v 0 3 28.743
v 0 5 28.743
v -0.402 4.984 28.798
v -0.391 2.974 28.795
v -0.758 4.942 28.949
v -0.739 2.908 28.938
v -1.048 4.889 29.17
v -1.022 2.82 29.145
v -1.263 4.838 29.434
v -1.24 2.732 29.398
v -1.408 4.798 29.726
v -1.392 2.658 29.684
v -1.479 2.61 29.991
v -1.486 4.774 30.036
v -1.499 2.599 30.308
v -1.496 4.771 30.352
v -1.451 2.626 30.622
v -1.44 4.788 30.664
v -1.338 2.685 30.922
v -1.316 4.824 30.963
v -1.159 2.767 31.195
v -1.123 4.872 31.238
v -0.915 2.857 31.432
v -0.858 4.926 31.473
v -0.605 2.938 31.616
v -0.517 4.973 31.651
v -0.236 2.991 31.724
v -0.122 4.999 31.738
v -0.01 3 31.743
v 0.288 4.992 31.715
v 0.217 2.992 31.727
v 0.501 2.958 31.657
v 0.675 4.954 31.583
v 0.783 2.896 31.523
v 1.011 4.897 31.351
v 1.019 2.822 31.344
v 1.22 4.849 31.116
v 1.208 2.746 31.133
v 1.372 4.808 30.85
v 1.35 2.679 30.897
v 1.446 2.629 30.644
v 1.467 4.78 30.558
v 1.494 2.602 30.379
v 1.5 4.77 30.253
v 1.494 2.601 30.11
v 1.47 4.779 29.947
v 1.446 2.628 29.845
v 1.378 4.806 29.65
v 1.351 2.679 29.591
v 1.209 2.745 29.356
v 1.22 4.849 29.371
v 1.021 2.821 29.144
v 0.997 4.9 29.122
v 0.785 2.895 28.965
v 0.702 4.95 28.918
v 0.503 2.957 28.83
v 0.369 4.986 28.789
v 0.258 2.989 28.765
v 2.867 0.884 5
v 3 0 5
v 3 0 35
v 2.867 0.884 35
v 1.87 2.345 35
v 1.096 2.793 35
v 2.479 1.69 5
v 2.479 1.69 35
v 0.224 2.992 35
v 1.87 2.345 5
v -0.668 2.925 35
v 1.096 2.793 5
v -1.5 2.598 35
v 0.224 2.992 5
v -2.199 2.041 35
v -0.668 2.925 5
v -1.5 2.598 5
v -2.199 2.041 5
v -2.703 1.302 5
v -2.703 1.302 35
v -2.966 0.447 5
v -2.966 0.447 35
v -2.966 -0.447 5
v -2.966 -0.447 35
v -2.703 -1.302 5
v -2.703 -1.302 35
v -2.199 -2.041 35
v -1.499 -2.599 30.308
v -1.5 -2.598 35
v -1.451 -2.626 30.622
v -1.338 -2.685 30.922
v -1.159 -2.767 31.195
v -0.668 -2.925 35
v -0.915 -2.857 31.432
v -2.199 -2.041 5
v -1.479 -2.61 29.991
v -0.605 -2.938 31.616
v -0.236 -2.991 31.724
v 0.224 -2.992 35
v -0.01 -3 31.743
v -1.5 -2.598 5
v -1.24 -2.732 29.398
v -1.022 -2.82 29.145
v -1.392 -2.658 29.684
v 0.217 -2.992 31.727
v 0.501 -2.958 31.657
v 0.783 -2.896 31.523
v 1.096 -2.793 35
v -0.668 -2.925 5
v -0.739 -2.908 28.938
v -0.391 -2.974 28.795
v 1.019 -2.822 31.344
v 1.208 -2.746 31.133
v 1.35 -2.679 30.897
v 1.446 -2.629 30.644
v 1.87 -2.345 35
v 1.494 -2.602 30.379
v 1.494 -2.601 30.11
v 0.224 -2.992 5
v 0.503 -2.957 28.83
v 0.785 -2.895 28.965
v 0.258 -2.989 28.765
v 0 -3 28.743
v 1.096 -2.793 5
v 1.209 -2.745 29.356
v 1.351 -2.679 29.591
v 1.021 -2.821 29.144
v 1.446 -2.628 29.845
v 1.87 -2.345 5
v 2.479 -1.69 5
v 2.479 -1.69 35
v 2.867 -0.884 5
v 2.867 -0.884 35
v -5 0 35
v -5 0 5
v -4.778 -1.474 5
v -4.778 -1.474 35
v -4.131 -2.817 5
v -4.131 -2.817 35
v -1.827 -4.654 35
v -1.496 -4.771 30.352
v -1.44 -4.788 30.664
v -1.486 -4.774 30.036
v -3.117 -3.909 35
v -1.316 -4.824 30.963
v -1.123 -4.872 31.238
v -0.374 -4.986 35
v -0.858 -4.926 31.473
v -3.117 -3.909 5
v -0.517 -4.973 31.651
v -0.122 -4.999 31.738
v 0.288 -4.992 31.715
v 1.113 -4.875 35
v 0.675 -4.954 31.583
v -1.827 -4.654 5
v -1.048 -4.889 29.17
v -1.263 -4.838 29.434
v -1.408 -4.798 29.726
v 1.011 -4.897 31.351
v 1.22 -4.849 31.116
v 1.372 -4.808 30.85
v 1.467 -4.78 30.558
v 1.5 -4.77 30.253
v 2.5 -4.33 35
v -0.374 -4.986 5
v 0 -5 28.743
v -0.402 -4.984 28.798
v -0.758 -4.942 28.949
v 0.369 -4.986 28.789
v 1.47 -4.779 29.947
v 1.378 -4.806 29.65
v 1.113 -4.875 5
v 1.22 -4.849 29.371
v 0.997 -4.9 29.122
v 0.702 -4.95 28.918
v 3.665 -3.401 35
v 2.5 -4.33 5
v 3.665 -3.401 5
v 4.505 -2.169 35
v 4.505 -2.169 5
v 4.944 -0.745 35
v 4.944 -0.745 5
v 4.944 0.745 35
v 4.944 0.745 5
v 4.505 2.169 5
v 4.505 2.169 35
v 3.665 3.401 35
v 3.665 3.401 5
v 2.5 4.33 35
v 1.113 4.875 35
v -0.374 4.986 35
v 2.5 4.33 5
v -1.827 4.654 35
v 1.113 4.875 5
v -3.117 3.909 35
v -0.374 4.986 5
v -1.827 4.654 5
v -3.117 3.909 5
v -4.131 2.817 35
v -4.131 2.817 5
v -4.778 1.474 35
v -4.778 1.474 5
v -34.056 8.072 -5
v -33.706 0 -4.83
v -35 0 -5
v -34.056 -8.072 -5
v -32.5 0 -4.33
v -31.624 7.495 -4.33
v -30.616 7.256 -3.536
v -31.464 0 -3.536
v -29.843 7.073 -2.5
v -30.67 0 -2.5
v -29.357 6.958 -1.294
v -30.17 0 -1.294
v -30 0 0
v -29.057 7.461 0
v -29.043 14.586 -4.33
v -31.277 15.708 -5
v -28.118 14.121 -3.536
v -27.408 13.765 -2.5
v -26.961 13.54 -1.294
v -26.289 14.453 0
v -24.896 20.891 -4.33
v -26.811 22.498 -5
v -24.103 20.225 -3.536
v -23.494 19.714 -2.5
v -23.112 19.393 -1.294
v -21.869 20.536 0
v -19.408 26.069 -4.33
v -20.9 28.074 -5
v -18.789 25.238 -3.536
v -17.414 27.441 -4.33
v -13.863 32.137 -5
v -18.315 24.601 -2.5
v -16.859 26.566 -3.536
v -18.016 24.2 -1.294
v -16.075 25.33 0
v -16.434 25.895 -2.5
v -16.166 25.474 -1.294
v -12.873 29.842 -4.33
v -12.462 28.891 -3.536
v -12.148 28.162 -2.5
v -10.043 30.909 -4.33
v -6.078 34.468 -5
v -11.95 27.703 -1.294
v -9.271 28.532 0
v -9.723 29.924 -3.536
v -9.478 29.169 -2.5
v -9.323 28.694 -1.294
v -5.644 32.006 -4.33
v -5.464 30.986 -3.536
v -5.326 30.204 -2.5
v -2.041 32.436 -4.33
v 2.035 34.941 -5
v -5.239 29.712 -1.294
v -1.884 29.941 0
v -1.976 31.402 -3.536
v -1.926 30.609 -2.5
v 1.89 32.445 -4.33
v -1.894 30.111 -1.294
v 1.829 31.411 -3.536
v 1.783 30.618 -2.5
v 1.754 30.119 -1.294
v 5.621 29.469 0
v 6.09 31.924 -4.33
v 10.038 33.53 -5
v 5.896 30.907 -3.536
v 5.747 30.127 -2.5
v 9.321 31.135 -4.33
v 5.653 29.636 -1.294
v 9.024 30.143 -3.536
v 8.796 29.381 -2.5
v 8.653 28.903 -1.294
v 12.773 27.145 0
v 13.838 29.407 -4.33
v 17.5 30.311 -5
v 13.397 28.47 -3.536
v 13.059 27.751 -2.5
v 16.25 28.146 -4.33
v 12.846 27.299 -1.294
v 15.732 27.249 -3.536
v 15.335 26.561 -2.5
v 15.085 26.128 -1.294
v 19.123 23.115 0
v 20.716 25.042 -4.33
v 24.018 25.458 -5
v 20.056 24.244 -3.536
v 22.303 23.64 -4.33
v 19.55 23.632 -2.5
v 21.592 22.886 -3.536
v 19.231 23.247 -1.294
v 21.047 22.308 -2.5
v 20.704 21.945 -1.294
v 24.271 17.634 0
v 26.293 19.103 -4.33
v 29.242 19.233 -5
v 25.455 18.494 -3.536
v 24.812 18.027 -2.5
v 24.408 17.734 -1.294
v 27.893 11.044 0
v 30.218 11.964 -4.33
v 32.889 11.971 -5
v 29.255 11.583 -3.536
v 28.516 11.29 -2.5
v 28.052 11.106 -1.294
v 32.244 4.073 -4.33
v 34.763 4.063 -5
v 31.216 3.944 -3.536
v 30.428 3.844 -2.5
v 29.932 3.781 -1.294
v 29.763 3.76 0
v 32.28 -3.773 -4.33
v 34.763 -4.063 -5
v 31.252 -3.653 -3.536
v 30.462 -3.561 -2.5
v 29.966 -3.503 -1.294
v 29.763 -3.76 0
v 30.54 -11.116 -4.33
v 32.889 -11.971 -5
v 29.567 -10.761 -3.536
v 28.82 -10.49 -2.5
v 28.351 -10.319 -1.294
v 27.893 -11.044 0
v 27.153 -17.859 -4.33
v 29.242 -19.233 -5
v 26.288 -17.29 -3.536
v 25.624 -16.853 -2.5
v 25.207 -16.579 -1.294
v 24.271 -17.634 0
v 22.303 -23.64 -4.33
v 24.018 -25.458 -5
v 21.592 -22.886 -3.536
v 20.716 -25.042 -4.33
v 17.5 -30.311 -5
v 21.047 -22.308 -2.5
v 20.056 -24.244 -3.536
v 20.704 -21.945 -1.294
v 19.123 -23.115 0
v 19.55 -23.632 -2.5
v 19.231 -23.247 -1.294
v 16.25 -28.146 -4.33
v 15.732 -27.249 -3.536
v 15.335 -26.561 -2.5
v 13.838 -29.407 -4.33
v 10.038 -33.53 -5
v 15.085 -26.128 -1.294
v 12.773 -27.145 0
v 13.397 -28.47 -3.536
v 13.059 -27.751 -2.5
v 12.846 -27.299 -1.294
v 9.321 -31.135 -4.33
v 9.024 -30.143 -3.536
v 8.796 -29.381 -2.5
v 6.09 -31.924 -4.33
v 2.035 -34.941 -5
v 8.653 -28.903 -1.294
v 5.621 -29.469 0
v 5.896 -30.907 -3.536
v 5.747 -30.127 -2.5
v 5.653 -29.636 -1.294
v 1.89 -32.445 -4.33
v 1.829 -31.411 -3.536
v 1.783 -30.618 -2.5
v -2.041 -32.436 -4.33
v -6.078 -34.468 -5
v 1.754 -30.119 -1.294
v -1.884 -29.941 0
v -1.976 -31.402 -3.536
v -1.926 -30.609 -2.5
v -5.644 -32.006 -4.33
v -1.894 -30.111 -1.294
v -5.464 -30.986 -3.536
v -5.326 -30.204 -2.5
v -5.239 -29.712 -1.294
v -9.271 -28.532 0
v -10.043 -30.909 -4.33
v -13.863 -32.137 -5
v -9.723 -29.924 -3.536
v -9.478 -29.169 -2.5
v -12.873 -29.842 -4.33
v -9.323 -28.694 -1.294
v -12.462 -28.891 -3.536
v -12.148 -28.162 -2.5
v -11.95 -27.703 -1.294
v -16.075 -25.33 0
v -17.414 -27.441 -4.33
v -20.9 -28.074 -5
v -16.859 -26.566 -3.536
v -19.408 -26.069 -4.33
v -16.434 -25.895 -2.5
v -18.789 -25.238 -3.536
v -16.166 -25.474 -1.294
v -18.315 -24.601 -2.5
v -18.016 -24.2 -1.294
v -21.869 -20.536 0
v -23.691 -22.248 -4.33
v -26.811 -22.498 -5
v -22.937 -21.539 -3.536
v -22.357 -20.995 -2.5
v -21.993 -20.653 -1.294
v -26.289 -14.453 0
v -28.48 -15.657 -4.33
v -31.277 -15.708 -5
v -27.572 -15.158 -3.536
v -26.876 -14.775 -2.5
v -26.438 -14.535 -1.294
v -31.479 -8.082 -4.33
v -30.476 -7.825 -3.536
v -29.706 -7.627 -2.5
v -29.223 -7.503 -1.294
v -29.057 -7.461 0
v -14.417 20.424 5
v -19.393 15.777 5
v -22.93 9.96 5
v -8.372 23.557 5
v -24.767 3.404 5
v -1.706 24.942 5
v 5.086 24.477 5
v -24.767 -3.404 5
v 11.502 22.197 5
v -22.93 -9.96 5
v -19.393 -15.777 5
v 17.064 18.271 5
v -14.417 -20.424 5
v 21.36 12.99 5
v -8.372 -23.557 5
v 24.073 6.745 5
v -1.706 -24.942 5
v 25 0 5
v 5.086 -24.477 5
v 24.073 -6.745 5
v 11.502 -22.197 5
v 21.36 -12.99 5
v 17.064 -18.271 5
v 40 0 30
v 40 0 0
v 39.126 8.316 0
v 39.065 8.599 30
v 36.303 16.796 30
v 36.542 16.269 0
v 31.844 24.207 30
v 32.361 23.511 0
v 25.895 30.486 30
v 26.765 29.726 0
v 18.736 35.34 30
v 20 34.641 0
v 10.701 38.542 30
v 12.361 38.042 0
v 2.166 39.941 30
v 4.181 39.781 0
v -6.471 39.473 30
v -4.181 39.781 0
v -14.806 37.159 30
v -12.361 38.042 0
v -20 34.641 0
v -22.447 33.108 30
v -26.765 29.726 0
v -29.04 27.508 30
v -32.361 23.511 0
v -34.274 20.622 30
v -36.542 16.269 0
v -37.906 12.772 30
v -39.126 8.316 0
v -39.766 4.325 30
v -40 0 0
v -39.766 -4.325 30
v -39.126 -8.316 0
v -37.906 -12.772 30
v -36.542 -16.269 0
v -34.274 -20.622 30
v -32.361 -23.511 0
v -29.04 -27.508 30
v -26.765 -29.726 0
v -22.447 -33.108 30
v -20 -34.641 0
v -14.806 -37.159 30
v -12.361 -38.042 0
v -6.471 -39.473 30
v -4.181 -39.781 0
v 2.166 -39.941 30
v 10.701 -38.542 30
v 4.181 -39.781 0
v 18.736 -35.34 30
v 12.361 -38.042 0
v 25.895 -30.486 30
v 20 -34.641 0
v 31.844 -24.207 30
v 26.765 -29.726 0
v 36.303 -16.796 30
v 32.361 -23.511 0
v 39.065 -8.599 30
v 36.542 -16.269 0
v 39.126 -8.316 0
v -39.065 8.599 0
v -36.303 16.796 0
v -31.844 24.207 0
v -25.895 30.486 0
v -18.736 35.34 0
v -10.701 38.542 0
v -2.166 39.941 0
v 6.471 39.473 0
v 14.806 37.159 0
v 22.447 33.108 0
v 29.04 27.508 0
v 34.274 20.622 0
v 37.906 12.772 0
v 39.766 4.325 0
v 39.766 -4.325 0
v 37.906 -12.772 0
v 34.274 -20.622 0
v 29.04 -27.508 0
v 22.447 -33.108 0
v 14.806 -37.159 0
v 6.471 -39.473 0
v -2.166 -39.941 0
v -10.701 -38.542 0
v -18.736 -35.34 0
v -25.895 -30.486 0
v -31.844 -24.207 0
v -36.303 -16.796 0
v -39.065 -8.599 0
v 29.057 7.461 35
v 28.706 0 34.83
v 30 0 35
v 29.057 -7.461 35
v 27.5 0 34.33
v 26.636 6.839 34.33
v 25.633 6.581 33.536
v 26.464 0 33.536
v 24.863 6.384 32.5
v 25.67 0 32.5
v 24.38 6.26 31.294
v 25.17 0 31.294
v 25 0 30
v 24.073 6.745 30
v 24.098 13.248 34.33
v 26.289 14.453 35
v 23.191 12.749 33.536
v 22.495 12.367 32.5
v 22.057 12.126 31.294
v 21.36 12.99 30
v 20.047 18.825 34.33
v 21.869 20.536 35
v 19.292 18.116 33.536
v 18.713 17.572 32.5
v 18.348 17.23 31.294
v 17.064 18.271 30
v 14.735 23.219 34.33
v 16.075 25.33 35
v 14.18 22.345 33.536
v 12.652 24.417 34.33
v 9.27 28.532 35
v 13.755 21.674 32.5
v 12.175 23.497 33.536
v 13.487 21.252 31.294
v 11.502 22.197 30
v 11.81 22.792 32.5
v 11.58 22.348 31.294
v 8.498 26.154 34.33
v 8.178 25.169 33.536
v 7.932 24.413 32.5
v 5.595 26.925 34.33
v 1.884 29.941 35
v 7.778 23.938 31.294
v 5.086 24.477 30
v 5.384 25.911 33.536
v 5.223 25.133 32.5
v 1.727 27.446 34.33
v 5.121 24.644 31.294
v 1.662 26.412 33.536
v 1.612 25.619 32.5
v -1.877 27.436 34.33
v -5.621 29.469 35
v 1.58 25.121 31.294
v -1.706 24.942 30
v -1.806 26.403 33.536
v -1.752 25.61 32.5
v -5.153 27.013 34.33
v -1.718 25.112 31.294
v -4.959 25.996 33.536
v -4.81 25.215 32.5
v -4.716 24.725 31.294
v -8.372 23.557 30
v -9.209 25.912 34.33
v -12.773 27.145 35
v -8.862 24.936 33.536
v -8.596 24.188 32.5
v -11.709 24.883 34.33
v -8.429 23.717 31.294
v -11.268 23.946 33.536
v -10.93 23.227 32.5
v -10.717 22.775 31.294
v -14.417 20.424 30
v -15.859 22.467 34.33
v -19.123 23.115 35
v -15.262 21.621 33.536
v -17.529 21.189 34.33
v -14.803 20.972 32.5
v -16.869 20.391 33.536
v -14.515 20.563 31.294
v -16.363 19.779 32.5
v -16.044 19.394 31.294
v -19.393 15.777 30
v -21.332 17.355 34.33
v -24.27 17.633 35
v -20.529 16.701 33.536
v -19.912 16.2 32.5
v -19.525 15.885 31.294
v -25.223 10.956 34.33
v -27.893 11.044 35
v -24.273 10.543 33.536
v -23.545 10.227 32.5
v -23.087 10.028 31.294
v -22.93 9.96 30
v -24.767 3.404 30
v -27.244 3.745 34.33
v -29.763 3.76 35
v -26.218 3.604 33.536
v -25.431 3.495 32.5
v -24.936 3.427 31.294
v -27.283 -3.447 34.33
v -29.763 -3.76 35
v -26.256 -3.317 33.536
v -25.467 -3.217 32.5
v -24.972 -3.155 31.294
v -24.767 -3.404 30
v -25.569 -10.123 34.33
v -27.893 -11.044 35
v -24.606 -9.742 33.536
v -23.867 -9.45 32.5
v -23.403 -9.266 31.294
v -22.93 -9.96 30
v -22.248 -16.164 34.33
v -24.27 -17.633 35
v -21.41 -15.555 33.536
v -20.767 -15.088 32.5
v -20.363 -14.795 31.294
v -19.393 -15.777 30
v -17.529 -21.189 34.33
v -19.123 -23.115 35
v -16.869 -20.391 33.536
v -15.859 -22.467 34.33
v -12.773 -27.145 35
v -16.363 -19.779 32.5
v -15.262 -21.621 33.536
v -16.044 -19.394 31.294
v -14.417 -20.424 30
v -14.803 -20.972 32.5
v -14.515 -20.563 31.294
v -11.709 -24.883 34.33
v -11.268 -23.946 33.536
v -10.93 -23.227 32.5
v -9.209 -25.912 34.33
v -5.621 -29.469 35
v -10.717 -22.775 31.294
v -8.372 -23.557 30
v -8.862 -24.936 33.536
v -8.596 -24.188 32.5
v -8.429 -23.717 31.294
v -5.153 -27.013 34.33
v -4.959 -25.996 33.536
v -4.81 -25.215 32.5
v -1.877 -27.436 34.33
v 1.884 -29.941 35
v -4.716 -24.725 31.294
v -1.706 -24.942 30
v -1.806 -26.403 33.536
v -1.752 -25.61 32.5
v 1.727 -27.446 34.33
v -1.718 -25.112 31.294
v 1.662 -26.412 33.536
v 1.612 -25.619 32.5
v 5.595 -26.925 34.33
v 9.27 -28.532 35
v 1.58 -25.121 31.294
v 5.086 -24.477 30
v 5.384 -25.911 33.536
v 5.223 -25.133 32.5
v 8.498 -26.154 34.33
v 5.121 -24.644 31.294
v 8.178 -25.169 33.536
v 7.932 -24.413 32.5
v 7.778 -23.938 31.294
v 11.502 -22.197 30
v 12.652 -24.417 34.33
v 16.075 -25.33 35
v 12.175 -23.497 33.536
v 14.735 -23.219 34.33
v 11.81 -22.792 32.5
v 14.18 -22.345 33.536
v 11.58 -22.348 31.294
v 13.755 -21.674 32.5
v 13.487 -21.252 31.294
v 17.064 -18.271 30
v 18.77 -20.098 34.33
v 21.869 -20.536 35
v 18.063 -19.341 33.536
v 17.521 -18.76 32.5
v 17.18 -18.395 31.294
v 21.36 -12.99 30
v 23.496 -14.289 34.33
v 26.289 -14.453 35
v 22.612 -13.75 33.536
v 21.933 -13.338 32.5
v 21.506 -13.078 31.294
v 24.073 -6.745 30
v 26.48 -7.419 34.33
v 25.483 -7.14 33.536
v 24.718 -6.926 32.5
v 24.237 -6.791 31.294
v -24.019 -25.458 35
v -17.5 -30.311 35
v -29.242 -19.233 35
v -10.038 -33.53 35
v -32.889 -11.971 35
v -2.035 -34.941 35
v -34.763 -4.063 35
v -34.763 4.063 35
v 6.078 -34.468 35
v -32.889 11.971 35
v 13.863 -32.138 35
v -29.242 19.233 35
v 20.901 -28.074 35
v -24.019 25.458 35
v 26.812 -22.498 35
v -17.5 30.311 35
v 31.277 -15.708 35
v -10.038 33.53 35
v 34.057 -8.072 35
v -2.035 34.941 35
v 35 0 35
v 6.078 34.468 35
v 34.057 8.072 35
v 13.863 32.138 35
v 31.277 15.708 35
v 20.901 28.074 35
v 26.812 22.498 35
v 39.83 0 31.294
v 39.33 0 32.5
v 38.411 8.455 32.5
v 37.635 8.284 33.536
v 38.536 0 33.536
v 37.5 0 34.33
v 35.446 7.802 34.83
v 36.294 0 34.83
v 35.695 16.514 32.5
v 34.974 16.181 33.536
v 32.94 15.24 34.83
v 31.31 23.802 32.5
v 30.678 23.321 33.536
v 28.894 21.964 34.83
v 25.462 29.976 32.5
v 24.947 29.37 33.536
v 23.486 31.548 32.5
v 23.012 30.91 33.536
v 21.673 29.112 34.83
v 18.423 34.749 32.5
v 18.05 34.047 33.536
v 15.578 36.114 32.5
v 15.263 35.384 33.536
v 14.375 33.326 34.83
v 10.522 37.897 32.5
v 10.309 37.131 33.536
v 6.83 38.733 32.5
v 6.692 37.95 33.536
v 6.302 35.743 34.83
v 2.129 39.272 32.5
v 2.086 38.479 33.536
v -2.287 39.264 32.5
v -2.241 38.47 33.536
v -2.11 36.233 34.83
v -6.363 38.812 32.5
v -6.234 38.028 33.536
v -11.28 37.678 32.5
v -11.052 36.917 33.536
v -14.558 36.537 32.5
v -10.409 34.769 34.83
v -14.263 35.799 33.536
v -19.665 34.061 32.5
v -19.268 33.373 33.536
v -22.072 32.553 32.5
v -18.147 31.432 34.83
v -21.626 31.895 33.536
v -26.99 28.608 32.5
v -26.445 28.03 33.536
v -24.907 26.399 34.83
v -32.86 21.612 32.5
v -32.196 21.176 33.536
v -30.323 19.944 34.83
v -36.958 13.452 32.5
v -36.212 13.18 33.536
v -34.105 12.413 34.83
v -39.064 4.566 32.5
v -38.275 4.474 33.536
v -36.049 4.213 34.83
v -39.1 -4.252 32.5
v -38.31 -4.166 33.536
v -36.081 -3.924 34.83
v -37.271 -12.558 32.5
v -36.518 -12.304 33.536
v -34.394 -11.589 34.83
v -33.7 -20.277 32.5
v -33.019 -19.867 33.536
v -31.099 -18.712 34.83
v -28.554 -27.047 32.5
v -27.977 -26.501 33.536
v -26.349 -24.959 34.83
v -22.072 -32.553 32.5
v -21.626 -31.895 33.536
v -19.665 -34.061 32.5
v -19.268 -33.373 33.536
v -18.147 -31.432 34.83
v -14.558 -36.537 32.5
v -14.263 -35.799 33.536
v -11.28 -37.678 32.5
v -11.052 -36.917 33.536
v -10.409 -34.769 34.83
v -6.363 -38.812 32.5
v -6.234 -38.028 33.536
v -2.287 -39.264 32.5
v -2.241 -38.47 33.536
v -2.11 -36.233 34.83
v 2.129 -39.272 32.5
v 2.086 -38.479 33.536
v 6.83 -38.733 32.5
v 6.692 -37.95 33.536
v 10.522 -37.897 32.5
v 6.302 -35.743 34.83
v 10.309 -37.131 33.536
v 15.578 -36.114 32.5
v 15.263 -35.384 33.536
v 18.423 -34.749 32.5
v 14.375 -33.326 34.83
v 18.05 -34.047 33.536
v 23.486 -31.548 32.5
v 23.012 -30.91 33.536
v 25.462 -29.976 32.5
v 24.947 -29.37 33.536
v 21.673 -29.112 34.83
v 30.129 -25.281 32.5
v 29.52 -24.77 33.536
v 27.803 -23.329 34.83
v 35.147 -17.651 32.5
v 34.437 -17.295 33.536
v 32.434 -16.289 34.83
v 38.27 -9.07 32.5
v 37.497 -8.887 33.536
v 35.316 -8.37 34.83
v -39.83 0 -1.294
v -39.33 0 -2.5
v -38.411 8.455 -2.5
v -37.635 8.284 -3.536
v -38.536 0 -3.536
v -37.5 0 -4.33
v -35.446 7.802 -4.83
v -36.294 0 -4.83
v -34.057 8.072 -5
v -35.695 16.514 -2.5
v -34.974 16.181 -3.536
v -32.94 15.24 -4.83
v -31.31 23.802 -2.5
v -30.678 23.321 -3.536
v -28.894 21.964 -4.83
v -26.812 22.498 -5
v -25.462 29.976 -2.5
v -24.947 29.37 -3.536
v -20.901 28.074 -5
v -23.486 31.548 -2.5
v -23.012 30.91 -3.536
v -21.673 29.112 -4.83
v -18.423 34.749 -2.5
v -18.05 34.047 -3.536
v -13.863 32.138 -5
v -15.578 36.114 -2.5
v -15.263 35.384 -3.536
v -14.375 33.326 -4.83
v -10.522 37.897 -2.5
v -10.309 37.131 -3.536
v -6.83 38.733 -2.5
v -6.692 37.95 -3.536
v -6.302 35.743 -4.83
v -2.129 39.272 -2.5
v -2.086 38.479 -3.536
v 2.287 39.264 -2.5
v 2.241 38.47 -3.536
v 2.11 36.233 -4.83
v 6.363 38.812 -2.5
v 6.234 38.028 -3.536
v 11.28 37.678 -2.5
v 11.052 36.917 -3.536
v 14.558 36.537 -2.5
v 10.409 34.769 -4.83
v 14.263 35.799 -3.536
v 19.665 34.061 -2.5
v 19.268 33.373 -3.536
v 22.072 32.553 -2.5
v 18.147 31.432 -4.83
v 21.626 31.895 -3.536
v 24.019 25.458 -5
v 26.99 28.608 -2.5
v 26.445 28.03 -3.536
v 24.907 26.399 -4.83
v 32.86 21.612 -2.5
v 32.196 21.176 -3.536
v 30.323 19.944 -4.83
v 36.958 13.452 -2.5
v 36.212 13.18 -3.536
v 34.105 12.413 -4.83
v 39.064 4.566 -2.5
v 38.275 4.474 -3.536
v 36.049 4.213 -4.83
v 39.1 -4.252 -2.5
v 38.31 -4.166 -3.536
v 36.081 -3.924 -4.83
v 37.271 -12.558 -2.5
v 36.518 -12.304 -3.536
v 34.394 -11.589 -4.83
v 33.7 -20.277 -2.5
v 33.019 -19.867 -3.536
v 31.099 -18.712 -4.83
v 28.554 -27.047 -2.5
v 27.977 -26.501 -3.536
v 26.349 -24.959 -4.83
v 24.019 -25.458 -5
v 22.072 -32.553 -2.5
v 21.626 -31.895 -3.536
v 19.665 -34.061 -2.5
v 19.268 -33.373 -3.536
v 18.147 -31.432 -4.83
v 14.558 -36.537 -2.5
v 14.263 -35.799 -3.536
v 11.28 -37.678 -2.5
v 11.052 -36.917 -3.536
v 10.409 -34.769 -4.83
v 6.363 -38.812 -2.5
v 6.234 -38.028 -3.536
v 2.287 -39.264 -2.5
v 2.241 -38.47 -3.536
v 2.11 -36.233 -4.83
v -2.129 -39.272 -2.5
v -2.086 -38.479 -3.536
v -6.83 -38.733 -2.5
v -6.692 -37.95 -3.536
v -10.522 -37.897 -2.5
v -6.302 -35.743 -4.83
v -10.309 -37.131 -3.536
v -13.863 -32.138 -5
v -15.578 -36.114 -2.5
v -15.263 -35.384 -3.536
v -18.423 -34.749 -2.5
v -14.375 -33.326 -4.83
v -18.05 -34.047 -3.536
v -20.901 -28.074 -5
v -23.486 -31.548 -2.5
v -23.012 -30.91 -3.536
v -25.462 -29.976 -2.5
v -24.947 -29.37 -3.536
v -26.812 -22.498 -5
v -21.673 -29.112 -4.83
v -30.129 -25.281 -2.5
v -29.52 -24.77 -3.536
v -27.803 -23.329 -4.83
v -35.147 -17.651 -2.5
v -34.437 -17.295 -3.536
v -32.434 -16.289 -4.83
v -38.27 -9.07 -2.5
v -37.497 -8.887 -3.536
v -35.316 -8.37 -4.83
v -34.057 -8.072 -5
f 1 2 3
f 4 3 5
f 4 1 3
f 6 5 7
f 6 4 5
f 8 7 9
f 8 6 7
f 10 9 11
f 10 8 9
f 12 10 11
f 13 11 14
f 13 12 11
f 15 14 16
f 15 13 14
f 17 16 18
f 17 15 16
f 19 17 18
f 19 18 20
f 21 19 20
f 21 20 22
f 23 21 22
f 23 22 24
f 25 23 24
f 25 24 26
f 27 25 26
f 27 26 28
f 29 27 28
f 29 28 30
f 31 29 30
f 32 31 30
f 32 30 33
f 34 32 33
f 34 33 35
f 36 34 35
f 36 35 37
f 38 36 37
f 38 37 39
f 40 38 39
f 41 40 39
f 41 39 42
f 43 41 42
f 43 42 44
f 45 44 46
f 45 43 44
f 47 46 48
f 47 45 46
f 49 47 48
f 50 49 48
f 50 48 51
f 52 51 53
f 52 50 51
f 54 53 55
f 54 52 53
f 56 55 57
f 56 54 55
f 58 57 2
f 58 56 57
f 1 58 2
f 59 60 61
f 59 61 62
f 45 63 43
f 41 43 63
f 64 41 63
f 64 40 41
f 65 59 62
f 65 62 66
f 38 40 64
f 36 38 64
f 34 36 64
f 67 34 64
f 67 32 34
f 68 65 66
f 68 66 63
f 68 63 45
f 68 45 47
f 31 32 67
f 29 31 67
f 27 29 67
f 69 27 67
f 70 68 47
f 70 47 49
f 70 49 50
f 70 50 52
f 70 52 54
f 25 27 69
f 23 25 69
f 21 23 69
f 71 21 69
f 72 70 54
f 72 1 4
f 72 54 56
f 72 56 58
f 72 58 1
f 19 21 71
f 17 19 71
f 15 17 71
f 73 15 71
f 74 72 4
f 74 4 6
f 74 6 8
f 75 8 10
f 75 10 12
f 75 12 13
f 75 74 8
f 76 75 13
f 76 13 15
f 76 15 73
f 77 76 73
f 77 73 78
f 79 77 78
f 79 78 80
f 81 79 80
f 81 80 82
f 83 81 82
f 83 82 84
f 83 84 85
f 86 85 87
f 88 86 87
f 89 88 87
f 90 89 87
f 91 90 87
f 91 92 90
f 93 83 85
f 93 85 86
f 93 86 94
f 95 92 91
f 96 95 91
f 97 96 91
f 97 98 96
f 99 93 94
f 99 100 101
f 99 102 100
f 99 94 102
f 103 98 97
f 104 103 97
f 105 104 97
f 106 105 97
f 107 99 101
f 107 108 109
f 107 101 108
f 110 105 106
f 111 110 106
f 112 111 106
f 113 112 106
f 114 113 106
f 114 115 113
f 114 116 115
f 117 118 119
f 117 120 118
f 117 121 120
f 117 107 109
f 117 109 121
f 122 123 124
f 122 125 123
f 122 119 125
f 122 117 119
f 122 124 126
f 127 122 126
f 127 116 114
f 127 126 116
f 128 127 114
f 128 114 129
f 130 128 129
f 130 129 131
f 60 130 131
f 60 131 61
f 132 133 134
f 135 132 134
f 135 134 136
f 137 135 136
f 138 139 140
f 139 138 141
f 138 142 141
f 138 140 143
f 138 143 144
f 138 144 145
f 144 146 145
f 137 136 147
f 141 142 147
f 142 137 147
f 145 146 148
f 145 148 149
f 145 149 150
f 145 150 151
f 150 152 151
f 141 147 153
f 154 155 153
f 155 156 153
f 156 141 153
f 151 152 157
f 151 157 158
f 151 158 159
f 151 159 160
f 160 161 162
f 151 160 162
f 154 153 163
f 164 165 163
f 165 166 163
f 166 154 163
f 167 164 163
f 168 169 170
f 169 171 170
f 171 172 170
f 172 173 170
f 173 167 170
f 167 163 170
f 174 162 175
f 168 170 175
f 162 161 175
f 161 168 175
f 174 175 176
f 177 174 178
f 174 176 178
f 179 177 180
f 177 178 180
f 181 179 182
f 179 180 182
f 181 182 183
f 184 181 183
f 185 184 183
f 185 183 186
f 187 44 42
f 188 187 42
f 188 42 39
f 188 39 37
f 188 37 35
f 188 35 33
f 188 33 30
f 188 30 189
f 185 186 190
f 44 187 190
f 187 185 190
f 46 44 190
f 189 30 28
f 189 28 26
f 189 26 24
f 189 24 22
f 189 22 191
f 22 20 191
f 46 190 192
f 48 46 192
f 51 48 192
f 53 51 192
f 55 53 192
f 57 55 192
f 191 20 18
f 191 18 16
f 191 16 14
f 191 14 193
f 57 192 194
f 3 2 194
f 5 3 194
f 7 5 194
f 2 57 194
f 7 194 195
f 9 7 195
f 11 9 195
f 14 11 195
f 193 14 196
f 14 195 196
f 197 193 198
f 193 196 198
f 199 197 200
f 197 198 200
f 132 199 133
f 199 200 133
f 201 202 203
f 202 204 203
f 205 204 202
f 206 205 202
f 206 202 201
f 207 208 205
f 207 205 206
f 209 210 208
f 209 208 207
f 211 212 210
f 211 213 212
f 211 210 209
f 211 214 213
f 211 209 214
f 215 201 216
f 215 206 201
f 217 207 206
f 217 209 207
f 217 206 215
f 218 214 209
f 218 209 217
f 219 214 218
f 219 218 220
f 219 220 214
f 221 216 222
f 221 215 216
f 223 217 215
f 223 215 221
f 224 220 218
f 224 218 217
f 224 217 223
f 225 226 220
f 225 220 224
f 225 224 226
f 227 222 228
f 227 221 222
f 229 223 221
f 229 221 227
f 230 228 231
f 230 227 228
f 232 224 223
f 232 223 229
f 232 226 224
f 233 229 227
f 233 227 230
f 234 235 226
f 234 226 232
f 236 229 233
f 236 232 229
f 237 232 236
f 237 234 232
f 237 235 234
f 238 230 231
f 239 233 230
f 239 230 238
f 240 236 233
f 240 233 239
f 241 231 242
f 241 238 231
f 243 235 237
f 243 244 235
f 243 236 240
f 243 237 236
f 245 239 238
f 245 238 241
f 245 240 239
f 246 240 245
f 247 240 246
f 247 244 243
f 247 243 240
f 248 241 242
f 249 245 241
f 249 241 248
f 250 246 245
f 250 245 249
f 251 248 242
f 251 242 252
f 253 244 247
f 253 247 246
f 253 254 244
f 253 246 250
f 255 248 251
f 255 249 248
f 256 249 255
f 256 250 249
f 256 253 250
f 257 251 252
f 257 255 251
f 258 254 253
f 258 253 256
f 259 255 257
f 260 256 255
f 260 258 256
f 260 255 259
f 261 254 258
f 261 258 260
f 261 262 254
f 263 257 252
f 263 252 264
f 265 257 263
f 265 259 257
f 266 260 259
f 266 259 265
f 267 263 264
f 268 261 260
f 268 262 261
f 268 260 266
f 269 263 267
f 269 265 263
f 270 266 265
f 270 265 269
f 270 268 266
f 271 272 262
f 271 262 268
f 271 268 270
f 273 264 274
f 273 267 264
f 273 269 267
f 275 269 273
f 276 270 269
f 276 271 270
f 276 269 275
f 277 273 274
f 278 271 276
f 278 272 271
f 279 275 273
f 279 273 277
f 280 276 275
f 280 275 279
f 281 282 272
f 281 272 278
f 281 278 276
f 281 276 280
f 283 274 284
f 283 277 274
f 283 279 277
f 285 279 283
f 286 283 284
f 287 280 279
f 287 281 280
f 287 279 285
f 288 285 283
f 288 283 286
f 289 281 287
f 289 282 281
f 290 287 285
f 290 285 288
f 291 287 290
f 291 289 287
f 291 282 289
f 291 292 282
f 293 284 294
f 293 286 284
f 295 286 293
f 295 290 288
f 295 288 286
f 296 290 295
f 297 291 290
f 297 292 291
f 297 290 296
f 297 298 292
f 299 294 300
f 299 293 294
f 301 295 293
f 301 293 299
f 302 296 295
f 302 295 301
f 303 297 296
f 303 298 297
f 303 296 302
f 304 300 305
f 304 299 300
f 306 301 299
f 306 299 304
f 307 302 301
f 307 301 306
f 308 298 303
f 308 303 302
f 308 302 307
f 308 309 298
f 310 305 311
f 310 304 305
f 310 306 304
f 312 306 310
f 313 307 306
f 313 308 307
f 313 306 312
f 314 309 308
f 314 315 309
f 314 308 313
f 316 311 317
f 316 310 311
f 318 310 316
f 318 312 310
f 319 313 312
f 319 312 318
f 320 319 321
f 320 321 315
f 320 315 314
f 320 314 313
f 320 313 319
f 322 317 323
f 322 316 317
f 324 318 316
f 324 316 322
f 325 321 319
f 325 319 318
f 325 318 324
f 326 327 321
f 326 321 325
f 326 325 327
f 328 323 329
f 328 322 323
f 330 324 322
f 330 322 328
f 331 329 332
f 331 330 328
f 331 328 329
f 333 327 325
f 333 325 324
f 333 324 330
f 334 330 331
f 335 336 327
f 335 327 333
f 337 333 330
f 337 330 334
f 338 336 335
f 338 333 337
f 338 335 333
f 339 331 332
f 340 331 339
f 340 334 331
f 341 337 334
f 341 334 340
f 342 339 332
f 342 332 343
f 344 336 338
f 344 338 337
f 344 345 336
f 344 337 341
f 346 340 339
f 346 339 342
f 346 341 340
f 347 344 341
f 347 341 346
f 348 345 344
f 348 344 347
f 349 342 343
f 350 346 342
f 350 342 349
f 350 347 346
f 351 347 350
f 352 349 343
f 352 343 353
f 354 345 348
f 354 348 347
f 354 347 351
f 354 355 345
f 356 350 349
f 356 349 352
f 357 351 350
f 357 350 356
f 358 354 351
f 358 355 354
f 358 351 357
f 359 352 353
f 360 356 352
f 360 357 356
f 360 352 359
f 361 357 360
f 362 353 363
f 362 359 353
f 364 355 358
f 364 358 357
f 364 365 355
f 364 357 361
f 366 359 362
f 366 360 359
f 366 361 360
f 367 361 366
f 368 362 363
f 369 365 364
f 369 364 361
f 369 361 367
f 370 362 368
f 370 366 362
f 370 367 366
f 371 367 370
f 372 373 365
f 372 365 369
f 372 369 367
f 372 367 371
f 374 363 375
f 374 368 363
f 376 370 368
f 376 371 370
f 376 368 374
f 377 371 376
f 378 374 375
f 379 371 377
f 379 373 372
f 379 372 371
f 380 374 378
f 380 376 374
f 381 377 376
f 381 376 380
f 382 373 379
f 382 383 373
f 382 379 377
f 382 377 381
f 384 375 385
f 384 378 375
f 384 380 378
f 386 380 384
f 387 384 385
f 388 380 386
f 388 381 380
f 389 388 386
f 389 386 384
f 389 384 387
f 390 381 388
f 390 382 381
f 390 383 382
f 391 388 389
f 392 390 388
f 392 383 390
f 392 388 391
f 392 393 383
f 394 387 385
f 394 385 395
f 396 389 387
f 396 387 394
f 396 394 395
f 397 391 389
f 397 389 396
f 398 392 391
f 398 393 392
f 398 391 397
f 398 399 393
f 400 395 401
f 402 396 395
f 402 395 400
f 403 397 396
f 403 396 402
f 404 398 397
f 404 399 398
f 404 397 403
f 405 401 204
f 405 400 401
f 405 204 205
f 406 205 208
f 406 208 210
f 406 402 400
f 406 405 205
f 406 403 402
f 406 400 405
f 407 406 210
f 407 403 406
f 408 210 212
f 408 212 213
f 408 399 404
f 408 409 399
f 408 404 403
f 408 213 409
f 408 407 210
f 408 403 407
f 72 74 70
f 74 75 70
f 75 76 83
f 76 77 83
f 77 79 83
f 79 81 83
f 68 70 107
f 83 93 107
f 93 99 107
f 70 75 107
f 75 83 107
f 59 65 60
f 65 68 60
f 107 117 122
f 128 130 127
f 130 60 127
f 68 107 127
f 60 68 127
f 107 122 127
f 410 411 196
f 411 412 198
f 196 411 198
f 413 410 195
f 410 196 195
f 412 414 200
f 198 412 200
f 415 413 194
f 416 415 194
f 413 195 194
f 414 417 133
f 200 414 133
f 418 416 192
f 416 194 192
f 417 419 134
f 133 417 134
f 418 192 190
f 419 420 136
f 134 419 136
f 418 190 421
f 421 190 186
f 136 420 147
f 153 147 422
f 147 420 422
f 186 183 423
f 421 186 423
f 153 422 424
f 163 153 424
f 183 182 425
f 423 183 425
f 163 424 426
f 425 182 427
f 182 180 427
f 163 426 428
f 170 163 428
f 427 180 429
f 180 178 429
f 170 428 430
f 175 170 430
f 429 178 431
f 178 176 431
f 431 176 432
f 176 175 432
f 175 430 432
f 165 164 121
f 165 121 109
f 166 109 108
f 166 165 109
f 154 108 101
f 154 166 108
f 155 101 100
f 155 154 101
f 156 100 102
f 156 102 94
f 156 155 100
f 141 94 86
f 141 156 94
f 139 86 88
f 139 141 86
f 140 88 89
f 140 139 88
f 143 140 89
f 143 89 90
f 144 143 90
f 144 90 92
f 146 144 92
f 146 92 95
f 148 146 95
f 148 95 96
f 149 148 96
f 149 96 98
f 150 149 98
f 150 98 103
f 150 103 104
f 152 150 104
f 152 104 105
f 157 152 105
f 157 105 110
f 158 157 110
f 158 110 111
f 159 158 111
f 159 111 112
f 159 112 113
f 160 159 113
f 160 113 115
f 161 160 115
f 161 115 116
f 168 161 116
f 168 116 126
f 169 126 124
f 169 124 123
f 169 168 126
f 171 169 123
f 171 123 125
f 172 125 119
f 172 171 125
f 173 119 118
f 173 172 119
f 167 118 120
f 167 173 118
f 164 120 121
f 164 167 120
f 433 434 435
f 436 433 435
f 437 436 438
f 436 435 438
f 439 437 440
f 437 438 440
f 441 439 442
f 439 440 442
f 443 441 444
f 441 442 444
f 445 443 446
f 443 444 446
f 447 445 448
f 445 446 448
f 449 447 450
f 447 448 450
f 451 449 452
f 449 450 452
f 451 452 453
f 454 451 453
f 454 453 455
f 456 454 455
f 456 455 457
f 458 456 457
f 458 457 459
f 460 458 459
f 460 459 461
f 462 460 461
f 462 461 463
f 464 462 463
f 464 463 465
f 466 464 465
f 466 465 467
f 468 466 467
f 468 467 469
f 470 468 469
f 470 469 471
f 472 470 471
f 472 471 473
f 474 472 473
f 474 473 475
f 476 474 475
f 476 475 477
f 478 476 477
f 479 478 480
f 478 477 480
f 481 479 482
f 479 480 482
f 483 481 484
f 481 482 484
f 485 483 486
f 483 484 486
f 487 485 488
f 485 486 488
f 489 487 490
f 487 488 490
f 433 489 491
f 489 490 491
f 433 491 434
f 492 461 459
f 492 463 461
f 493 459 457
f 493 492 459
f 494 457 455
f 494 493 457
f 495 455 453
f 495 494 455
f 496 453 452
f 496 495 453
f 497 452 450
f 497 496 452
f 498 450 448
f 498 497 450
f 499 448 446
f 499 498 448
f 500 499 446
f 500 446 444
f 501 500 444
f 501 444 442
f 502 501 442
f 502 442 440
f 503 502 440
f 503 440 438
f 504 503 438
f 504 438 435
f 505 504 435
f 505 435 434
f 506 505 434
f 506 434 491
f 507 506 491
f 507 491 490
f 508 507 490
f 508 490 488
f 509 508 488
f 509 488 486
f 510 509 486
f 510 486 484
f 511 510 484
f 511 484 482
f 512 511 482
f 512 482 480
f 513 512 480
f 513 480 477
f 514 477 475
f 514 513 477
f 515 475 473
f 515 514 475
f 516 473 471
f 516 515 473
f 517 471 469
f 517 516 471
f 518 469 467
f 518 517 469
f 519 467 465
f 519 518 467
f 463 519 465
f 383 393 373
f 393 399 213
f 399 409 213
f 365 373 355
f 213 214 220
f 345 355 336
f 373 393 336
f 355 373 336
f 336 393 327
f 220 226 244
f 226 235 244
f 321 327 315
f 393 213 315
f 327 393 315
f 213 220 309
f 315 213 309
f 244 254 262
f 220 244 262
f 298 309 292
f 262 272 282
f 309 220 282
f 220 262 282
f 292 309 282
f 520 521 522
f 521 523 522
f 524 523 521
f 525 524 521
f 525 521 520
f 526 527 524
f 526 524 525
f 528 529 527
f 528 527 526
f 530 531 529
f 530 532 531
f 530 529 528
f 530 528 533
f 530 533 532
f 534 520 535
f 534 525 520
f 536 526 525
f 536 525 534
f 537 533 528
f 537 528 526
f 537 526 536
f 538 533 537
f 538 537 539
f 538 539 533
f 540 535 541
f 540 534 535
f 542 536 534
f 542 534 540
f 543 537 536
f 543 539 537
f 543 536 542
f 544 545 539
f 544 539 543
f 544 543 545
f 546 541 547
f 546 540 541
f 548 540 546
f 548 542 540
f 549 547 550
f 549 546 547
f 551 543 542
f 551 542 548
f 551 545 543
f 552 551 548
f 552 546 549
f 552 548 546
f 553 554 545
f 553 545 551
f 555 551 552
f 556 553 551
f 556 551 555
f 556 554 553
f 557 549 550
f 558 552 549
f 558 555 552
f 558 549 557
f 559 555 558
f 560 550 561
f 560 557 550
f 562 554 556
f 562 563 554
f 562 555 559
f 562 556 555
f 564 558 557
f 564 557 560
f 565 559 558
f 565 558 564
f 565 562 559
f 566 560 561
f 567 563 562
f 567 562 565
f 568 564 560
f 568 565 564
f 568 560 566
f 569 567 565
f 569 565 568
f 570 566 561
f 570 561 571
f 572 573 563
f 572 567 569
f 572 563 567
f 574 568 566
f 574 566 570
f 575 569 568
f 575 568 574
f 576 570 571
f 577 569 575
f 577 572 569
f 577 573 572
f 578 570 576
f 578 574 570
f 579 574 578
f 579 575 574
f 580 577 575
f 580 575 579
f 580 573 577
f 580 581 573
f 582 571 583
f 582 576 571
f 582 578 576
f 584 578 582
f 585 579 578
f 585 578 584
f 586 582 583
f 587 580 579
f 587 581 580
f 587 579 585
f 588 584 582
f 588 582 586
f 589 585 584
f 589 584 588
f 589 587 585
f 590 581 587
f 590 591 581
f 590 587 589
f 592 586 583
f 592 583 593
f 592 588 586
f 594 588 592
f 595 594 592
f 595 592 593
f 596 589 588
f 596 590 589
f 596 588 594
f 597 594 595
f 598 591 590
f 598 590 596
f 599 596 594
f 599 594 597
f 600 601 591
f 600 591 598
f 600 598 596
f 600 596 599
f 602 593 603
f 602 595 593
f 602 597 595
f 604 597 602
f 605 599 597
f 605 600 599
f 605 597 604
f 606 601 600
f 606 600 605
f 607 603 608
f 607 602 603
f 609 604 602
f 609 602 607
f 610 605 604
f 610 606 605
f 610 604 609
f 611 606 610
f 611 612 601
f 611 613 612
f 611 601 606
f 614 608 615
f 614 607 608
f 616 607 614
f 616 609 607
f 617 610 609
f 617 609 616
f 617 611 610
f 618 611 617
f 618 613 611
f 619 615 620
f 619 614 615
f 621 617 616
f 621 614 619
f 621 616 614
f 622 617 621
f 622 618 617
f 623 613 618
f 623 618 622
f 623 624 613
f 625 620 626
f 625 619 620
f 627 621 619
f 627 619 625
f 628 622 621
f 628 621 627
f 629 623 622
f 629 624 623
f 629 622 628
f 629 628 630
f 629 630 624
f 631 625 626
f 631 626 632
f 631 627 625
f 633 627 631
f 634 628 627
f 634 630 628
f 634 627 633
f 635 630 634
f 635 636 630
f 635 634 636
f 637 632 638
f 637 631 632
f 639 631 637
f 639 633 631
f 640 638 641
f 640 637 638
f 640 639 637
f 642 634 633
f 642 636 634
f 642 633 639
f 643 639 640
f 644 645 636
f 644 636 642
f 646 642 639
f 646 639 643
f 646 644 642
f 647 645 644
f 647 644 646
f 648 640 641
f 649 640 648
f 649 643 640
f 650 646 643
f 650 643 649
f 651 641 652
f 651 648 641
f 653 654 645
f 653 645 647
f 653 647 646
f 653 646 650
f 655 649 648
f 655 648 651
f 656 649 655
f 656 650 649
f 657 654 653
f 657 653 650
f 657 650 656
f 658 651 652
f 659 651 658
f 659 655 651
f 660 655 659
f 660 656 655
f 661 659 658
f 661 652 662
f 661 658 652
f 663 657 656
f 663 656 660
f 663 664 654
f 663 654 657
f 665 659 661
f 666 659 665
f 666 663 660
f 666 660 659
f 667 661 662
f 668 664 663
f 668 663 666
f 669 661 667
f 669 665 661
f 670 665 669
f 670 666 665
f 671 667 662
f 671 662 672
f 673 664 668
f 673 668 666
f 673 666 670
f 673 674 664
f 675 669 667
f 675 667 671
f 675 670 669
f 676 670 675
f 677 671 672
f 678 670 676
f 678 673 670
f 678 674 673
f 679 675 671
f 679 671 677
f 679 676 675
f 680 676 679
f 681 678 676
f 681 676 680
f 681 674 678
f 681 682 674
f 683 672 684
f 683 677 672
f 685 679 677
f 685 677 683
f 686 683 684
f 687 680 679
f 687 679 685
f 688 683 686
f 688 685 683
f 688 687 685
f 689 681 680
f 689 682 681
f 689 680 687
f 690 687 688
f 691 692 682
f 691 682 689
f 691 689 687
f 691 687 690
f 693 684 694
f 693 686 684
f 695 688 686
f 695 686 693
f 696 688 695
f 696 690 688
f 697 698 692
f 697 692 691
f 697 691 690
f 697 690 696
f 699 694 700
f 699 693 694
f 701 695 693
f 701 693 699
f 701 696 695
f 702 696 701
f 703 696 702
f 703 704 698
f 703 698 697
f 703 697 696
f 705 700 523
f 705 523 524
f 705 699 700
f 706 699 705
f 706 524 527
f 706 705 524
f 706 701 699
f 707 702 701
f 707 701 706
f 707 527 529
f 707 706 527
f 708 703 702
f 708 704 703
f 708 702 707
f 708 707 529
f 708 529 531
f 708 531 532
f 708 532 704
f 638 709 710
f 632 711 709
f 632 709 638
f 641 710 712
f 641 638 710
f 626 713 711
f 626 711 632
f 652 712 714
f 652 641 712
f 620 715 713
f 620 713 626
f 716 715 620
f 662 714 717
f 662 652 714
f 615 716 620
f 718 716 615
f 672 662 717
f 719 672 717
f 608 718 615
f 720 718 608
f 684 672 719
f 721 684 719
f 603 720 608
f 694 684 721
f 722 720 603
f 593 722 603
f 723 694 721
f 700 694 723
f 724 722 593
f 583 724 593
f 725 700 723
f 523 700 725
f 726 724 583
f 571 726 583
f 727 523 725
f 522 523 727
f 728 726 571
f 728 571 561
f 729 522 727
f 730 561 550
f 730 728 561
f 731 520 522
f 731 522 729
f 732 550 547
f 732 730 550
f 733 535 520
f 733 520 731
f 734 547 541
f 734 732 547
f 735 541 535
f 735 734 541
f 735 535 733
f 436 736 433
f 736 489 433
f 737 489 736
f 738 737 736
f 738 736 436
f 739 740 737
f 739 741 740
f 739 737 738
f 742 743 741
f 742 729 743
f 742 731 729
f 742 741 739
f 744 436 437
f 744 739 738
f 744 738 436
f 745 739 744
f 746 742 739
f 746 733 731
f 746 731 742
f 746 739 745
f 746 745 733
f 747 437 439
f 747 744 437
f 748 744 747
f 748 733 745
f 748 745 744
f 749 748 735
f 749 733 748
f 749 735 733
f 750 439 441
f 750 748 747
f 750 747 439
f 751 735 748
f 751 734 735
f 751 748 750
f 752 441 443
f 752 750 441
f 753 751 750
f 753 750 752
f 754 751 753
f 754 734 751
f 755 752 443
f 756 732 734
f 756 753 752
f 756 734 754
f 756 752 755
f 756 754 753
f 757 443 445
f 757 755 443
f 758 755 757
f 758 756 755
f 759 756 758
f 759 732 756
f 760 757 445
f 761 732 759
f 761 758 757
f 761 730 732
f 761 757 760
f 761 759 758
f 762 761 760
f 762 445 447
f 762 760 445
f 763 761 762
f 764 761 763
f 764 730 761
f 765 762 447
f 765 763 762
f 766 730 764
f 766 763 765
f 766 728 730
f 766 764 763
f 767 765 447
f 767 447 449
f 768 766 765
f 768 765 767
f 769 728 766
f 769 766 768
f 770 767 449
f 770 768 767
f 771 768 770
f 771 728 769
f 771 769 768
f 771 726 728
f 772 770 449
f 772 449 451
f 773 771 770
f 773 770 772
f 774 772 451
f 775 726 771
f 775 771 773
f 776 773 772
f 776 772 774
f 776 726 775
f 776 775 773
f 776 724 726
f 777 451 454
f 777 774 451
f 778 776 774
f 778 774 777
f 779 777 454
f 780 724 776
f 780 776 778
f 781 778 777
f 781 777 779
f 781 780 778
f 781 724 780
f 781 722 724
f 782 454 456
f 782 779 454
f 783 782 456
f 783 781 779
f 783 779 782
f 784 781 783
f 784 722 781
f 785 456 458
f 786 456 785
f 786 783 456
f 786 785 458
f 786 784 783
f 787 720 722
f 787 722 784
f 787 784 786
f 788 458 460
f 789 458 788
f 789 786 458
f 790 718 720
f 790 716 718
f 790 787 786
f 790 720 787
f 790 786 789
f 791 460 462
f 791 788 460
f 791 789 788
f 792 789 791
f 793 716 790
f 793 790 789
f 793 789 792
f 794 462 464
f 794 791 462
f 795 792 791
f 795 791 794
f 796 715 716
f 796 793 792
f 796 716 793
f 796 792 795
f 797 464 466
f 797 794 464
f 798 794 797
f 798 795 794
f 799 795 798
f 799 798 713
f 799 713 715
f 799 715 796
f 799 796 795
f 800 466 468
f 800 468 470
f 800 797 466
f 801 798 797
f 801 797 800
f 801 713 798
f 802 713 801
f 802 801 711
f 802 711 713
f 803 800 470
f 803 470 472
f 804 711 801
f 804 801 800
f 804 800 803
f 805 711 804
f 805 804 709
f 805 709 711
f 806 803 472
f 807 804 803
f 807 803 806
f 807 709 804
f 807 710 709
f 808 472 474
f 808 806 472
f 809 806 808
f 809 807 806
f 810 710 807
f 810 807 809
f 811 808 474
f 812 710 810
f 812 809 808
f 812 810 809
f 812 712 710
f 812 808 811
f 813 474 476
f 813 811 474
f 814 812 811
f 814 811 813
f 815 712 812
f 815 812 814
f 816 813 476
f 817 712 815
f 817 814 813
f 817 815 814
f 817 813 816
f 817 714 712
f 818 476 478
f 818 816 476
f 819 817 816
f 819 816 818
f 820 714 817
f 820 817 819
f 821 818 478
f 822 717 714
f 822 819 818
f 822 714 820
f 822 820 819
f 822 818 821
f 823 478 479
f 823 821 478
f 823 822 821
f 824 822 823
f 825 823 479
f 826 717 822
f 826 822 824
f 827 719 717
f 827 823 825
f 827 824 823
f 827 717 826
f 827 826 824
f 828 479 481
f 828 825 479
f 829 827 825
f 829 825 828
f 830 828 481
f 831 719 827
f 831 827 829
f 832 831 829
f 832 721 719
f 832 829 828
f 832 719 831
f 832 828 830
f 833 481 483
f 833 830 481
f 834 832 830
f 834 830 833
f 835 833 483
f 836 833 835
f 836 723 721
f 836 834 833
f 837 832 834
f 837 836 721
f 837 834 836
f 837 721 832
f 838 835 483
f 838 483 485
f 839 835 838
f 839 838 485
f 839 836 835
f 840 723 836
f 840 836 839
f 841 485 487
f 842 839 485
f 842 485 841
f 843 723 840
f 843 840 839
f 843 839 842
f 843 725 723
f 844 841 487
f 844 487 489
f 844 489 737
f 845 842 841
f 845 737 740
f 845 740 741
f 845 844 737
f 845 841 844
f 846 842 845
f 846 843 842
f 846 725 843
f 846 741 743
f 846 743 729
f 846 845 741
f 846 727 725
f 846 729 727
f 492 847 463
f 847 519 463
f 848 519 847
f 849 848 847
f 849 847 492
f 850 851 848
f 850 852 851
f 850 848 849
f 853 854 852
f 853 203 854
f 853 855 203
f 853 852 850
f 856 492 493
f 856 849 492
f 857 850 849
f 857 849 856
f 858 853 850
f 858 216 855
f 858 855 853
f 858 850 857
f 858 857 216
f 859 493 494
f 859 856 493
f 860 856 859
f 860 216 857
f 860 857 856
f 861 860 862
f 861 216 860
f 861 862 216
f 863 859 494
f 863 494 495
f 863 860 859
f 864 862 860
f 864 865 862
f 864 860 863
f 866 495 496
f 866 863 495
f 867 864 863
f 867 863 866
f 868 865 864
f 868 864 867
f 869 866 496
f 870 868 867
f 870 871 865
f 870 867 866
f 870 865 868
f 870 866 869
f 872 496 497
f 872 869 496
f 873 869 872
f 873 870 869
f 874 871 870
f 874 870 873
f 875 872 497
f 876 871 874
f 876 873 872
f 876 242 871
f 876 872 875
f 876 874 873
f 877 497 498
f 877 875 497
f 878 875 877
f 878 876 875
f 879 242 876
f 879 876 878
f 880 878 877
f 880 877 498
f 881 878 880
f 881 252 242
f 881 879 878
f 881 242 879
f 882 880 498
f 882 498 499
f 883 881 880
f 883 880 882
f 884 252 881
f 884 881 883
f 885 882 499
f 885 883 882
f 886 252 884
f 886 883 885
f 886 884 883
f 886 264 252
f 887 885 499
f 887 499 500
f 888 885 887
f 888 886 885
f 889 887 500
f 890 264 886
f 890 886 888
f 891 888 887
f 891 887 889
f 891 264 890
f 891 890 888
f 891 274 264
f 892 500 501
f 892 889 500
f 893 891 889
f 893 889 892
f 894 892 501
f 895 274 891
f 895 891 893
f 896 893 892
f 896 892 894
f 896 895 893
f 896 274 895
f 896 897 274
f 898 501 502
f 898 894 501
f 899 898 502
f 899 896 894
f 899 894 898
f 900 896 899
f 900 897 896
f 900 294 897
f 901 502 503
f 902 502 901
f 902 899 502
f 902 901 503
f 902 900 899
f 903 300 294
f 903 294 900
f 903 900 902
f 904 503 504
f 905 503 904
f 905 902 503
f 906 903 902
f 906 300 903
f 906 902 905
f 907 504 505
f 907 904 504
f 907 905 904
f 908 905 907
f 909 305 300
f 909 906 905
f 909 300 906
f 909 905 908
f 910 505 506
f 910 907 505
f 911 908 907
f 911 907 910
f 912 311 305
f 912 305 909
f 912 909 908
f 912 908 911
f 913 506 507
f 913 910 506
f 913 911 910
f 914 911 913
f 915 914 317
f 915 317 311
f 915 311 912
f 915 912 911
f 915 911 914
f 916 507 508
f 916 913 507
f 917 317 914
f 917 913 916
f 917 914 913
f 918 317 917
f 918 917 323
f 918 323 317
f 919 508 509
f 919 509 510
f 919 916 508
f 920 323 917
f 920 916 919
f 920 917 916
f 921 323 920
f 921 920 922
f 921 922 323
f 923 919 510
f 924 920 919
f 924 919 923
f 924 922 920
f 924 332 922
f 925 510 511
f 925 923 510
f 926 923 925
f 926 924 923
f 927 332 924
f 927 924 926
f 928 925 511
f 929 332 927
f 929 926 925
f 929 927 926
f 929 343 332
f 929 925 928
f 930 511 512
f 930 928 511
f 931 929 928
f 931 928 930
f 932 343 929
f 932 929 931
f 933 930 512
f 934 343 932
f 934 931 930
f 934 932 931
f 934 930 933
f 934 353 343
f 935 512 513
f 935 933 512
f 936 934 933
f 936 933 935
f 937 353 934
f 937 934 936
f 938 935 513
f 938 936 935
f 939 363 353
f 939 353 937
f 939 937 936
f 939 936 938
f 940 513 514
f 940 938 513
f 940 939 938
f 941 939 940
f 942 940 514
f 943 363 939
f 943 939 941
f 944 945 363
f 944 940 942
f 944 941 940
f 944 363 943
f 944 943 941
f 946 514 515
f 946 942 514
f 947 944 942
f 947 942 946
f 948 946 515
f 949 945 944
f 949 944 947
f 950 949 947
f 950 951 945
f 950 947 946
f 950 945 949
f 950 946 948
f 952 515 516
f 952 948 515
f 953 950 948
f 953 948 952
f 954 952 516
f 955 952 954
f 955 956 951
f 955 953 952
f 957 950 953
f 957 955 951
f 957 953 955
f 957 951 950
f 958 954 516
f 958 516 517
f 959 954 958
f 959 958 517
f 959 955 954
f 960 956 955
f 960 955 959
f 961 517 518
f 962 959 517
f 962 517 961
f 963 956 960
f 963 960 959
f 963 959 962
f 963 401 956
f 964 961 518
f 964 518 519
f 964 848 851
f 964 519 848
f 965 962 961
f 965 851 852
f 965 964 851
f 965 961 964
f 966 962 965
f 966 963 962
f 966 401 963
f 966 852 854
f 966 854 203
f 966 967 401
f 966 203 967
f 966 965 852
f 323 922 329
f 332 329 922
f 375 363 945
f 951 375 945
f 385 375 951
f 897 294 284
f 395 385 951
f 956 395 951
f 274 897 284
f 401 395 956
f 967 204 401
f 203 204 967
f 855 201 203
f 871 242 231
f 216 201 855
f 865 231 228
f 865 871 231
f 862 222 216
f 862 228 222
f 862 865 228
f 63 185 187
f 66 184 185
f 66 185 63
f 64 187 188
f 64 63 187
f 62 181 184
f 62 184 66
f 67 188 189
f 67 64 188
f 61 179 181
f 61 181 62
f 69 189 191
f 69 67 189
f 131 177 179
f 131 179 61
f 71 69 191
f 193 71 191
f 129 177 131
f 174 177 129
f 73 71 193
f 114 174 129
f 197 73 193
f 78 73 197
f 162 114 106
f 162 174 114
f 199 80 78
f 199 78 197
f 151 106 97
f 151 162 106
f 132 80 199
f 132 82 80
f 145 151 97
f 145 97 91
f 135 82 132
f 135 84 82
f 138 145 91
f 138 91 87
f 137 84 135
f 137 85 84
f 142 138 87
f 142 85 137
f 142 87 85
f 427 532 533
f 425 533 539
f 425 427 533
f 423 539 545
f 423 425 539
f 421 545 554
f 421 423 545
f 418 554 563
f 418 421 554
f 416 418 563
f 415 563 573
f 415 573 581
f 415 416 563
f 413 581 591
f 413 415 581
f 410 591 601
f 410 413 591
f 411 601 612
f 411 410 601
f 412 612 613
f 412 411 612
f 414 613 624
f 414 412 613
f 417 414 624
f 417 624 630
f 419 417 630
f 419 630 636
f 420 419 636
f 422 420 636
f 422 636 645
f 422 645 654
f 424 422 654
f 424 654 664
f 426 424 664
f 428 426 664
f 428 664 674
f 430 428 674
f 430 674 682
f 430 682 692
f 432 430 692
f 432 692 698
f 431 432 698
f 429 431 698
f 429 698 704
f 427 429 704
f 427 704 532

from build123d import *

# Parameters (mm, degrees)
SKETCH1_R            = 40
SKETCH1_R_2          = 25
BOSS_EXTRUDE1_DEPTH  = 35
SKETCH2_R            = 40
BOSS_EXTRUDE2_DEPTH  = 5
BOSS_EXTRUDE3_START  = 5
SKETCH4_R            = 40
SKETCH4_R_2          = 30
BOSS_EXTRUDE3_DEPTH  = 5
SKETCH6_R            = 5
SKETCH6_R_2          = 3
HUB_DEPTH            = 30
FILLET1_DESIGN_R     = 5
HUB_HOLES_DEPTH      = 10
HUB_HOLES_DEPTH_BACK = 10
SKETCH8_R            = 1.5


with BuildPart() as part:
    # Sketch1 → Boss-Extrude1 (new body)
    with BuildSketch(Plane.XY):
        Circle(SKETCH1_R)
        Circle(SKETCH1_R_2, mode=Mode.SUBTRACT)
    extrude(amount=BOSS_EXTRUDE1_DEPTH)

    # Sketch2 → Boss-Extrude2 (add)
    with BuildSketch(Plane(origin=(0, 0, 0), x_dir=(-1, 0, 0), z_dir=(0, 0, -1))):
        with Locations(Location((0, 0, 0), (0, 0, 180))):
            Circle(SKETCH2_R)
    extrude(amount=-BOSS_EXTRUDE2_DEPTH)

    # Sketch4 → Boss-Extrude3 (add)
    with BuildSketch(Plane(origin=(0, 0, 0), x_dir=(-1, 0, 0), z_dir=(0, 0, -1)).offset(BOSS_EXTRUDE3_START)):
        Circle(SKETCH4_R)
        Circle(SKETCH4_R_2, mode=Mode.SUBTRACT)
    extrude(amount=-BOSS_EXTRUDE3_DEPTH)

    # Sketch6 → hub (add)
    with BuildSketch(Plane.XY.offset(5)):
        with Locations(Location((0, 0, 0), (0, 0, 180))):
            Circle(SKETCH6_R)
        Circle(SKETCH6_R_2, mode=Mode.SUBTRACT)
    extrude(amount=HUB_DEPTH)

    # Fillet1 design
    fillet1_design_edges = [part.edges().sort_by_distance(p)[0] for p in [
        (40, 0, -5),
        (30, 0, -5),
        (-40, 0, 35),
        (-25, 0, 35),
    ]]
    fillet(fillet1_design_edges, radius=FILLET1_DESIGN_R - 0.0001)  # a hair under: the kernel refuses the full size

    # Sketch8 → hub holes (cut, two sides: drawn at the far end of the back side and taken through both)
    with BuildSketch(Plane(origin=(0, 0, 0), x_dir=(1, 0, 0), z_dir=(0, 1, 0)).offset(-HUB_HOLES_DEPTH_BACK)):
        with Locations(Location((0, -30.243060778, 0), (0, 0, 90))):
            Circle(SKETCH8_R)
    extrude(amount=HUB_HOLES_DEPTH + HUB_HOLES_DEPTH_BACK, mode=Mode.SUBTRACT)


solid = part.part
